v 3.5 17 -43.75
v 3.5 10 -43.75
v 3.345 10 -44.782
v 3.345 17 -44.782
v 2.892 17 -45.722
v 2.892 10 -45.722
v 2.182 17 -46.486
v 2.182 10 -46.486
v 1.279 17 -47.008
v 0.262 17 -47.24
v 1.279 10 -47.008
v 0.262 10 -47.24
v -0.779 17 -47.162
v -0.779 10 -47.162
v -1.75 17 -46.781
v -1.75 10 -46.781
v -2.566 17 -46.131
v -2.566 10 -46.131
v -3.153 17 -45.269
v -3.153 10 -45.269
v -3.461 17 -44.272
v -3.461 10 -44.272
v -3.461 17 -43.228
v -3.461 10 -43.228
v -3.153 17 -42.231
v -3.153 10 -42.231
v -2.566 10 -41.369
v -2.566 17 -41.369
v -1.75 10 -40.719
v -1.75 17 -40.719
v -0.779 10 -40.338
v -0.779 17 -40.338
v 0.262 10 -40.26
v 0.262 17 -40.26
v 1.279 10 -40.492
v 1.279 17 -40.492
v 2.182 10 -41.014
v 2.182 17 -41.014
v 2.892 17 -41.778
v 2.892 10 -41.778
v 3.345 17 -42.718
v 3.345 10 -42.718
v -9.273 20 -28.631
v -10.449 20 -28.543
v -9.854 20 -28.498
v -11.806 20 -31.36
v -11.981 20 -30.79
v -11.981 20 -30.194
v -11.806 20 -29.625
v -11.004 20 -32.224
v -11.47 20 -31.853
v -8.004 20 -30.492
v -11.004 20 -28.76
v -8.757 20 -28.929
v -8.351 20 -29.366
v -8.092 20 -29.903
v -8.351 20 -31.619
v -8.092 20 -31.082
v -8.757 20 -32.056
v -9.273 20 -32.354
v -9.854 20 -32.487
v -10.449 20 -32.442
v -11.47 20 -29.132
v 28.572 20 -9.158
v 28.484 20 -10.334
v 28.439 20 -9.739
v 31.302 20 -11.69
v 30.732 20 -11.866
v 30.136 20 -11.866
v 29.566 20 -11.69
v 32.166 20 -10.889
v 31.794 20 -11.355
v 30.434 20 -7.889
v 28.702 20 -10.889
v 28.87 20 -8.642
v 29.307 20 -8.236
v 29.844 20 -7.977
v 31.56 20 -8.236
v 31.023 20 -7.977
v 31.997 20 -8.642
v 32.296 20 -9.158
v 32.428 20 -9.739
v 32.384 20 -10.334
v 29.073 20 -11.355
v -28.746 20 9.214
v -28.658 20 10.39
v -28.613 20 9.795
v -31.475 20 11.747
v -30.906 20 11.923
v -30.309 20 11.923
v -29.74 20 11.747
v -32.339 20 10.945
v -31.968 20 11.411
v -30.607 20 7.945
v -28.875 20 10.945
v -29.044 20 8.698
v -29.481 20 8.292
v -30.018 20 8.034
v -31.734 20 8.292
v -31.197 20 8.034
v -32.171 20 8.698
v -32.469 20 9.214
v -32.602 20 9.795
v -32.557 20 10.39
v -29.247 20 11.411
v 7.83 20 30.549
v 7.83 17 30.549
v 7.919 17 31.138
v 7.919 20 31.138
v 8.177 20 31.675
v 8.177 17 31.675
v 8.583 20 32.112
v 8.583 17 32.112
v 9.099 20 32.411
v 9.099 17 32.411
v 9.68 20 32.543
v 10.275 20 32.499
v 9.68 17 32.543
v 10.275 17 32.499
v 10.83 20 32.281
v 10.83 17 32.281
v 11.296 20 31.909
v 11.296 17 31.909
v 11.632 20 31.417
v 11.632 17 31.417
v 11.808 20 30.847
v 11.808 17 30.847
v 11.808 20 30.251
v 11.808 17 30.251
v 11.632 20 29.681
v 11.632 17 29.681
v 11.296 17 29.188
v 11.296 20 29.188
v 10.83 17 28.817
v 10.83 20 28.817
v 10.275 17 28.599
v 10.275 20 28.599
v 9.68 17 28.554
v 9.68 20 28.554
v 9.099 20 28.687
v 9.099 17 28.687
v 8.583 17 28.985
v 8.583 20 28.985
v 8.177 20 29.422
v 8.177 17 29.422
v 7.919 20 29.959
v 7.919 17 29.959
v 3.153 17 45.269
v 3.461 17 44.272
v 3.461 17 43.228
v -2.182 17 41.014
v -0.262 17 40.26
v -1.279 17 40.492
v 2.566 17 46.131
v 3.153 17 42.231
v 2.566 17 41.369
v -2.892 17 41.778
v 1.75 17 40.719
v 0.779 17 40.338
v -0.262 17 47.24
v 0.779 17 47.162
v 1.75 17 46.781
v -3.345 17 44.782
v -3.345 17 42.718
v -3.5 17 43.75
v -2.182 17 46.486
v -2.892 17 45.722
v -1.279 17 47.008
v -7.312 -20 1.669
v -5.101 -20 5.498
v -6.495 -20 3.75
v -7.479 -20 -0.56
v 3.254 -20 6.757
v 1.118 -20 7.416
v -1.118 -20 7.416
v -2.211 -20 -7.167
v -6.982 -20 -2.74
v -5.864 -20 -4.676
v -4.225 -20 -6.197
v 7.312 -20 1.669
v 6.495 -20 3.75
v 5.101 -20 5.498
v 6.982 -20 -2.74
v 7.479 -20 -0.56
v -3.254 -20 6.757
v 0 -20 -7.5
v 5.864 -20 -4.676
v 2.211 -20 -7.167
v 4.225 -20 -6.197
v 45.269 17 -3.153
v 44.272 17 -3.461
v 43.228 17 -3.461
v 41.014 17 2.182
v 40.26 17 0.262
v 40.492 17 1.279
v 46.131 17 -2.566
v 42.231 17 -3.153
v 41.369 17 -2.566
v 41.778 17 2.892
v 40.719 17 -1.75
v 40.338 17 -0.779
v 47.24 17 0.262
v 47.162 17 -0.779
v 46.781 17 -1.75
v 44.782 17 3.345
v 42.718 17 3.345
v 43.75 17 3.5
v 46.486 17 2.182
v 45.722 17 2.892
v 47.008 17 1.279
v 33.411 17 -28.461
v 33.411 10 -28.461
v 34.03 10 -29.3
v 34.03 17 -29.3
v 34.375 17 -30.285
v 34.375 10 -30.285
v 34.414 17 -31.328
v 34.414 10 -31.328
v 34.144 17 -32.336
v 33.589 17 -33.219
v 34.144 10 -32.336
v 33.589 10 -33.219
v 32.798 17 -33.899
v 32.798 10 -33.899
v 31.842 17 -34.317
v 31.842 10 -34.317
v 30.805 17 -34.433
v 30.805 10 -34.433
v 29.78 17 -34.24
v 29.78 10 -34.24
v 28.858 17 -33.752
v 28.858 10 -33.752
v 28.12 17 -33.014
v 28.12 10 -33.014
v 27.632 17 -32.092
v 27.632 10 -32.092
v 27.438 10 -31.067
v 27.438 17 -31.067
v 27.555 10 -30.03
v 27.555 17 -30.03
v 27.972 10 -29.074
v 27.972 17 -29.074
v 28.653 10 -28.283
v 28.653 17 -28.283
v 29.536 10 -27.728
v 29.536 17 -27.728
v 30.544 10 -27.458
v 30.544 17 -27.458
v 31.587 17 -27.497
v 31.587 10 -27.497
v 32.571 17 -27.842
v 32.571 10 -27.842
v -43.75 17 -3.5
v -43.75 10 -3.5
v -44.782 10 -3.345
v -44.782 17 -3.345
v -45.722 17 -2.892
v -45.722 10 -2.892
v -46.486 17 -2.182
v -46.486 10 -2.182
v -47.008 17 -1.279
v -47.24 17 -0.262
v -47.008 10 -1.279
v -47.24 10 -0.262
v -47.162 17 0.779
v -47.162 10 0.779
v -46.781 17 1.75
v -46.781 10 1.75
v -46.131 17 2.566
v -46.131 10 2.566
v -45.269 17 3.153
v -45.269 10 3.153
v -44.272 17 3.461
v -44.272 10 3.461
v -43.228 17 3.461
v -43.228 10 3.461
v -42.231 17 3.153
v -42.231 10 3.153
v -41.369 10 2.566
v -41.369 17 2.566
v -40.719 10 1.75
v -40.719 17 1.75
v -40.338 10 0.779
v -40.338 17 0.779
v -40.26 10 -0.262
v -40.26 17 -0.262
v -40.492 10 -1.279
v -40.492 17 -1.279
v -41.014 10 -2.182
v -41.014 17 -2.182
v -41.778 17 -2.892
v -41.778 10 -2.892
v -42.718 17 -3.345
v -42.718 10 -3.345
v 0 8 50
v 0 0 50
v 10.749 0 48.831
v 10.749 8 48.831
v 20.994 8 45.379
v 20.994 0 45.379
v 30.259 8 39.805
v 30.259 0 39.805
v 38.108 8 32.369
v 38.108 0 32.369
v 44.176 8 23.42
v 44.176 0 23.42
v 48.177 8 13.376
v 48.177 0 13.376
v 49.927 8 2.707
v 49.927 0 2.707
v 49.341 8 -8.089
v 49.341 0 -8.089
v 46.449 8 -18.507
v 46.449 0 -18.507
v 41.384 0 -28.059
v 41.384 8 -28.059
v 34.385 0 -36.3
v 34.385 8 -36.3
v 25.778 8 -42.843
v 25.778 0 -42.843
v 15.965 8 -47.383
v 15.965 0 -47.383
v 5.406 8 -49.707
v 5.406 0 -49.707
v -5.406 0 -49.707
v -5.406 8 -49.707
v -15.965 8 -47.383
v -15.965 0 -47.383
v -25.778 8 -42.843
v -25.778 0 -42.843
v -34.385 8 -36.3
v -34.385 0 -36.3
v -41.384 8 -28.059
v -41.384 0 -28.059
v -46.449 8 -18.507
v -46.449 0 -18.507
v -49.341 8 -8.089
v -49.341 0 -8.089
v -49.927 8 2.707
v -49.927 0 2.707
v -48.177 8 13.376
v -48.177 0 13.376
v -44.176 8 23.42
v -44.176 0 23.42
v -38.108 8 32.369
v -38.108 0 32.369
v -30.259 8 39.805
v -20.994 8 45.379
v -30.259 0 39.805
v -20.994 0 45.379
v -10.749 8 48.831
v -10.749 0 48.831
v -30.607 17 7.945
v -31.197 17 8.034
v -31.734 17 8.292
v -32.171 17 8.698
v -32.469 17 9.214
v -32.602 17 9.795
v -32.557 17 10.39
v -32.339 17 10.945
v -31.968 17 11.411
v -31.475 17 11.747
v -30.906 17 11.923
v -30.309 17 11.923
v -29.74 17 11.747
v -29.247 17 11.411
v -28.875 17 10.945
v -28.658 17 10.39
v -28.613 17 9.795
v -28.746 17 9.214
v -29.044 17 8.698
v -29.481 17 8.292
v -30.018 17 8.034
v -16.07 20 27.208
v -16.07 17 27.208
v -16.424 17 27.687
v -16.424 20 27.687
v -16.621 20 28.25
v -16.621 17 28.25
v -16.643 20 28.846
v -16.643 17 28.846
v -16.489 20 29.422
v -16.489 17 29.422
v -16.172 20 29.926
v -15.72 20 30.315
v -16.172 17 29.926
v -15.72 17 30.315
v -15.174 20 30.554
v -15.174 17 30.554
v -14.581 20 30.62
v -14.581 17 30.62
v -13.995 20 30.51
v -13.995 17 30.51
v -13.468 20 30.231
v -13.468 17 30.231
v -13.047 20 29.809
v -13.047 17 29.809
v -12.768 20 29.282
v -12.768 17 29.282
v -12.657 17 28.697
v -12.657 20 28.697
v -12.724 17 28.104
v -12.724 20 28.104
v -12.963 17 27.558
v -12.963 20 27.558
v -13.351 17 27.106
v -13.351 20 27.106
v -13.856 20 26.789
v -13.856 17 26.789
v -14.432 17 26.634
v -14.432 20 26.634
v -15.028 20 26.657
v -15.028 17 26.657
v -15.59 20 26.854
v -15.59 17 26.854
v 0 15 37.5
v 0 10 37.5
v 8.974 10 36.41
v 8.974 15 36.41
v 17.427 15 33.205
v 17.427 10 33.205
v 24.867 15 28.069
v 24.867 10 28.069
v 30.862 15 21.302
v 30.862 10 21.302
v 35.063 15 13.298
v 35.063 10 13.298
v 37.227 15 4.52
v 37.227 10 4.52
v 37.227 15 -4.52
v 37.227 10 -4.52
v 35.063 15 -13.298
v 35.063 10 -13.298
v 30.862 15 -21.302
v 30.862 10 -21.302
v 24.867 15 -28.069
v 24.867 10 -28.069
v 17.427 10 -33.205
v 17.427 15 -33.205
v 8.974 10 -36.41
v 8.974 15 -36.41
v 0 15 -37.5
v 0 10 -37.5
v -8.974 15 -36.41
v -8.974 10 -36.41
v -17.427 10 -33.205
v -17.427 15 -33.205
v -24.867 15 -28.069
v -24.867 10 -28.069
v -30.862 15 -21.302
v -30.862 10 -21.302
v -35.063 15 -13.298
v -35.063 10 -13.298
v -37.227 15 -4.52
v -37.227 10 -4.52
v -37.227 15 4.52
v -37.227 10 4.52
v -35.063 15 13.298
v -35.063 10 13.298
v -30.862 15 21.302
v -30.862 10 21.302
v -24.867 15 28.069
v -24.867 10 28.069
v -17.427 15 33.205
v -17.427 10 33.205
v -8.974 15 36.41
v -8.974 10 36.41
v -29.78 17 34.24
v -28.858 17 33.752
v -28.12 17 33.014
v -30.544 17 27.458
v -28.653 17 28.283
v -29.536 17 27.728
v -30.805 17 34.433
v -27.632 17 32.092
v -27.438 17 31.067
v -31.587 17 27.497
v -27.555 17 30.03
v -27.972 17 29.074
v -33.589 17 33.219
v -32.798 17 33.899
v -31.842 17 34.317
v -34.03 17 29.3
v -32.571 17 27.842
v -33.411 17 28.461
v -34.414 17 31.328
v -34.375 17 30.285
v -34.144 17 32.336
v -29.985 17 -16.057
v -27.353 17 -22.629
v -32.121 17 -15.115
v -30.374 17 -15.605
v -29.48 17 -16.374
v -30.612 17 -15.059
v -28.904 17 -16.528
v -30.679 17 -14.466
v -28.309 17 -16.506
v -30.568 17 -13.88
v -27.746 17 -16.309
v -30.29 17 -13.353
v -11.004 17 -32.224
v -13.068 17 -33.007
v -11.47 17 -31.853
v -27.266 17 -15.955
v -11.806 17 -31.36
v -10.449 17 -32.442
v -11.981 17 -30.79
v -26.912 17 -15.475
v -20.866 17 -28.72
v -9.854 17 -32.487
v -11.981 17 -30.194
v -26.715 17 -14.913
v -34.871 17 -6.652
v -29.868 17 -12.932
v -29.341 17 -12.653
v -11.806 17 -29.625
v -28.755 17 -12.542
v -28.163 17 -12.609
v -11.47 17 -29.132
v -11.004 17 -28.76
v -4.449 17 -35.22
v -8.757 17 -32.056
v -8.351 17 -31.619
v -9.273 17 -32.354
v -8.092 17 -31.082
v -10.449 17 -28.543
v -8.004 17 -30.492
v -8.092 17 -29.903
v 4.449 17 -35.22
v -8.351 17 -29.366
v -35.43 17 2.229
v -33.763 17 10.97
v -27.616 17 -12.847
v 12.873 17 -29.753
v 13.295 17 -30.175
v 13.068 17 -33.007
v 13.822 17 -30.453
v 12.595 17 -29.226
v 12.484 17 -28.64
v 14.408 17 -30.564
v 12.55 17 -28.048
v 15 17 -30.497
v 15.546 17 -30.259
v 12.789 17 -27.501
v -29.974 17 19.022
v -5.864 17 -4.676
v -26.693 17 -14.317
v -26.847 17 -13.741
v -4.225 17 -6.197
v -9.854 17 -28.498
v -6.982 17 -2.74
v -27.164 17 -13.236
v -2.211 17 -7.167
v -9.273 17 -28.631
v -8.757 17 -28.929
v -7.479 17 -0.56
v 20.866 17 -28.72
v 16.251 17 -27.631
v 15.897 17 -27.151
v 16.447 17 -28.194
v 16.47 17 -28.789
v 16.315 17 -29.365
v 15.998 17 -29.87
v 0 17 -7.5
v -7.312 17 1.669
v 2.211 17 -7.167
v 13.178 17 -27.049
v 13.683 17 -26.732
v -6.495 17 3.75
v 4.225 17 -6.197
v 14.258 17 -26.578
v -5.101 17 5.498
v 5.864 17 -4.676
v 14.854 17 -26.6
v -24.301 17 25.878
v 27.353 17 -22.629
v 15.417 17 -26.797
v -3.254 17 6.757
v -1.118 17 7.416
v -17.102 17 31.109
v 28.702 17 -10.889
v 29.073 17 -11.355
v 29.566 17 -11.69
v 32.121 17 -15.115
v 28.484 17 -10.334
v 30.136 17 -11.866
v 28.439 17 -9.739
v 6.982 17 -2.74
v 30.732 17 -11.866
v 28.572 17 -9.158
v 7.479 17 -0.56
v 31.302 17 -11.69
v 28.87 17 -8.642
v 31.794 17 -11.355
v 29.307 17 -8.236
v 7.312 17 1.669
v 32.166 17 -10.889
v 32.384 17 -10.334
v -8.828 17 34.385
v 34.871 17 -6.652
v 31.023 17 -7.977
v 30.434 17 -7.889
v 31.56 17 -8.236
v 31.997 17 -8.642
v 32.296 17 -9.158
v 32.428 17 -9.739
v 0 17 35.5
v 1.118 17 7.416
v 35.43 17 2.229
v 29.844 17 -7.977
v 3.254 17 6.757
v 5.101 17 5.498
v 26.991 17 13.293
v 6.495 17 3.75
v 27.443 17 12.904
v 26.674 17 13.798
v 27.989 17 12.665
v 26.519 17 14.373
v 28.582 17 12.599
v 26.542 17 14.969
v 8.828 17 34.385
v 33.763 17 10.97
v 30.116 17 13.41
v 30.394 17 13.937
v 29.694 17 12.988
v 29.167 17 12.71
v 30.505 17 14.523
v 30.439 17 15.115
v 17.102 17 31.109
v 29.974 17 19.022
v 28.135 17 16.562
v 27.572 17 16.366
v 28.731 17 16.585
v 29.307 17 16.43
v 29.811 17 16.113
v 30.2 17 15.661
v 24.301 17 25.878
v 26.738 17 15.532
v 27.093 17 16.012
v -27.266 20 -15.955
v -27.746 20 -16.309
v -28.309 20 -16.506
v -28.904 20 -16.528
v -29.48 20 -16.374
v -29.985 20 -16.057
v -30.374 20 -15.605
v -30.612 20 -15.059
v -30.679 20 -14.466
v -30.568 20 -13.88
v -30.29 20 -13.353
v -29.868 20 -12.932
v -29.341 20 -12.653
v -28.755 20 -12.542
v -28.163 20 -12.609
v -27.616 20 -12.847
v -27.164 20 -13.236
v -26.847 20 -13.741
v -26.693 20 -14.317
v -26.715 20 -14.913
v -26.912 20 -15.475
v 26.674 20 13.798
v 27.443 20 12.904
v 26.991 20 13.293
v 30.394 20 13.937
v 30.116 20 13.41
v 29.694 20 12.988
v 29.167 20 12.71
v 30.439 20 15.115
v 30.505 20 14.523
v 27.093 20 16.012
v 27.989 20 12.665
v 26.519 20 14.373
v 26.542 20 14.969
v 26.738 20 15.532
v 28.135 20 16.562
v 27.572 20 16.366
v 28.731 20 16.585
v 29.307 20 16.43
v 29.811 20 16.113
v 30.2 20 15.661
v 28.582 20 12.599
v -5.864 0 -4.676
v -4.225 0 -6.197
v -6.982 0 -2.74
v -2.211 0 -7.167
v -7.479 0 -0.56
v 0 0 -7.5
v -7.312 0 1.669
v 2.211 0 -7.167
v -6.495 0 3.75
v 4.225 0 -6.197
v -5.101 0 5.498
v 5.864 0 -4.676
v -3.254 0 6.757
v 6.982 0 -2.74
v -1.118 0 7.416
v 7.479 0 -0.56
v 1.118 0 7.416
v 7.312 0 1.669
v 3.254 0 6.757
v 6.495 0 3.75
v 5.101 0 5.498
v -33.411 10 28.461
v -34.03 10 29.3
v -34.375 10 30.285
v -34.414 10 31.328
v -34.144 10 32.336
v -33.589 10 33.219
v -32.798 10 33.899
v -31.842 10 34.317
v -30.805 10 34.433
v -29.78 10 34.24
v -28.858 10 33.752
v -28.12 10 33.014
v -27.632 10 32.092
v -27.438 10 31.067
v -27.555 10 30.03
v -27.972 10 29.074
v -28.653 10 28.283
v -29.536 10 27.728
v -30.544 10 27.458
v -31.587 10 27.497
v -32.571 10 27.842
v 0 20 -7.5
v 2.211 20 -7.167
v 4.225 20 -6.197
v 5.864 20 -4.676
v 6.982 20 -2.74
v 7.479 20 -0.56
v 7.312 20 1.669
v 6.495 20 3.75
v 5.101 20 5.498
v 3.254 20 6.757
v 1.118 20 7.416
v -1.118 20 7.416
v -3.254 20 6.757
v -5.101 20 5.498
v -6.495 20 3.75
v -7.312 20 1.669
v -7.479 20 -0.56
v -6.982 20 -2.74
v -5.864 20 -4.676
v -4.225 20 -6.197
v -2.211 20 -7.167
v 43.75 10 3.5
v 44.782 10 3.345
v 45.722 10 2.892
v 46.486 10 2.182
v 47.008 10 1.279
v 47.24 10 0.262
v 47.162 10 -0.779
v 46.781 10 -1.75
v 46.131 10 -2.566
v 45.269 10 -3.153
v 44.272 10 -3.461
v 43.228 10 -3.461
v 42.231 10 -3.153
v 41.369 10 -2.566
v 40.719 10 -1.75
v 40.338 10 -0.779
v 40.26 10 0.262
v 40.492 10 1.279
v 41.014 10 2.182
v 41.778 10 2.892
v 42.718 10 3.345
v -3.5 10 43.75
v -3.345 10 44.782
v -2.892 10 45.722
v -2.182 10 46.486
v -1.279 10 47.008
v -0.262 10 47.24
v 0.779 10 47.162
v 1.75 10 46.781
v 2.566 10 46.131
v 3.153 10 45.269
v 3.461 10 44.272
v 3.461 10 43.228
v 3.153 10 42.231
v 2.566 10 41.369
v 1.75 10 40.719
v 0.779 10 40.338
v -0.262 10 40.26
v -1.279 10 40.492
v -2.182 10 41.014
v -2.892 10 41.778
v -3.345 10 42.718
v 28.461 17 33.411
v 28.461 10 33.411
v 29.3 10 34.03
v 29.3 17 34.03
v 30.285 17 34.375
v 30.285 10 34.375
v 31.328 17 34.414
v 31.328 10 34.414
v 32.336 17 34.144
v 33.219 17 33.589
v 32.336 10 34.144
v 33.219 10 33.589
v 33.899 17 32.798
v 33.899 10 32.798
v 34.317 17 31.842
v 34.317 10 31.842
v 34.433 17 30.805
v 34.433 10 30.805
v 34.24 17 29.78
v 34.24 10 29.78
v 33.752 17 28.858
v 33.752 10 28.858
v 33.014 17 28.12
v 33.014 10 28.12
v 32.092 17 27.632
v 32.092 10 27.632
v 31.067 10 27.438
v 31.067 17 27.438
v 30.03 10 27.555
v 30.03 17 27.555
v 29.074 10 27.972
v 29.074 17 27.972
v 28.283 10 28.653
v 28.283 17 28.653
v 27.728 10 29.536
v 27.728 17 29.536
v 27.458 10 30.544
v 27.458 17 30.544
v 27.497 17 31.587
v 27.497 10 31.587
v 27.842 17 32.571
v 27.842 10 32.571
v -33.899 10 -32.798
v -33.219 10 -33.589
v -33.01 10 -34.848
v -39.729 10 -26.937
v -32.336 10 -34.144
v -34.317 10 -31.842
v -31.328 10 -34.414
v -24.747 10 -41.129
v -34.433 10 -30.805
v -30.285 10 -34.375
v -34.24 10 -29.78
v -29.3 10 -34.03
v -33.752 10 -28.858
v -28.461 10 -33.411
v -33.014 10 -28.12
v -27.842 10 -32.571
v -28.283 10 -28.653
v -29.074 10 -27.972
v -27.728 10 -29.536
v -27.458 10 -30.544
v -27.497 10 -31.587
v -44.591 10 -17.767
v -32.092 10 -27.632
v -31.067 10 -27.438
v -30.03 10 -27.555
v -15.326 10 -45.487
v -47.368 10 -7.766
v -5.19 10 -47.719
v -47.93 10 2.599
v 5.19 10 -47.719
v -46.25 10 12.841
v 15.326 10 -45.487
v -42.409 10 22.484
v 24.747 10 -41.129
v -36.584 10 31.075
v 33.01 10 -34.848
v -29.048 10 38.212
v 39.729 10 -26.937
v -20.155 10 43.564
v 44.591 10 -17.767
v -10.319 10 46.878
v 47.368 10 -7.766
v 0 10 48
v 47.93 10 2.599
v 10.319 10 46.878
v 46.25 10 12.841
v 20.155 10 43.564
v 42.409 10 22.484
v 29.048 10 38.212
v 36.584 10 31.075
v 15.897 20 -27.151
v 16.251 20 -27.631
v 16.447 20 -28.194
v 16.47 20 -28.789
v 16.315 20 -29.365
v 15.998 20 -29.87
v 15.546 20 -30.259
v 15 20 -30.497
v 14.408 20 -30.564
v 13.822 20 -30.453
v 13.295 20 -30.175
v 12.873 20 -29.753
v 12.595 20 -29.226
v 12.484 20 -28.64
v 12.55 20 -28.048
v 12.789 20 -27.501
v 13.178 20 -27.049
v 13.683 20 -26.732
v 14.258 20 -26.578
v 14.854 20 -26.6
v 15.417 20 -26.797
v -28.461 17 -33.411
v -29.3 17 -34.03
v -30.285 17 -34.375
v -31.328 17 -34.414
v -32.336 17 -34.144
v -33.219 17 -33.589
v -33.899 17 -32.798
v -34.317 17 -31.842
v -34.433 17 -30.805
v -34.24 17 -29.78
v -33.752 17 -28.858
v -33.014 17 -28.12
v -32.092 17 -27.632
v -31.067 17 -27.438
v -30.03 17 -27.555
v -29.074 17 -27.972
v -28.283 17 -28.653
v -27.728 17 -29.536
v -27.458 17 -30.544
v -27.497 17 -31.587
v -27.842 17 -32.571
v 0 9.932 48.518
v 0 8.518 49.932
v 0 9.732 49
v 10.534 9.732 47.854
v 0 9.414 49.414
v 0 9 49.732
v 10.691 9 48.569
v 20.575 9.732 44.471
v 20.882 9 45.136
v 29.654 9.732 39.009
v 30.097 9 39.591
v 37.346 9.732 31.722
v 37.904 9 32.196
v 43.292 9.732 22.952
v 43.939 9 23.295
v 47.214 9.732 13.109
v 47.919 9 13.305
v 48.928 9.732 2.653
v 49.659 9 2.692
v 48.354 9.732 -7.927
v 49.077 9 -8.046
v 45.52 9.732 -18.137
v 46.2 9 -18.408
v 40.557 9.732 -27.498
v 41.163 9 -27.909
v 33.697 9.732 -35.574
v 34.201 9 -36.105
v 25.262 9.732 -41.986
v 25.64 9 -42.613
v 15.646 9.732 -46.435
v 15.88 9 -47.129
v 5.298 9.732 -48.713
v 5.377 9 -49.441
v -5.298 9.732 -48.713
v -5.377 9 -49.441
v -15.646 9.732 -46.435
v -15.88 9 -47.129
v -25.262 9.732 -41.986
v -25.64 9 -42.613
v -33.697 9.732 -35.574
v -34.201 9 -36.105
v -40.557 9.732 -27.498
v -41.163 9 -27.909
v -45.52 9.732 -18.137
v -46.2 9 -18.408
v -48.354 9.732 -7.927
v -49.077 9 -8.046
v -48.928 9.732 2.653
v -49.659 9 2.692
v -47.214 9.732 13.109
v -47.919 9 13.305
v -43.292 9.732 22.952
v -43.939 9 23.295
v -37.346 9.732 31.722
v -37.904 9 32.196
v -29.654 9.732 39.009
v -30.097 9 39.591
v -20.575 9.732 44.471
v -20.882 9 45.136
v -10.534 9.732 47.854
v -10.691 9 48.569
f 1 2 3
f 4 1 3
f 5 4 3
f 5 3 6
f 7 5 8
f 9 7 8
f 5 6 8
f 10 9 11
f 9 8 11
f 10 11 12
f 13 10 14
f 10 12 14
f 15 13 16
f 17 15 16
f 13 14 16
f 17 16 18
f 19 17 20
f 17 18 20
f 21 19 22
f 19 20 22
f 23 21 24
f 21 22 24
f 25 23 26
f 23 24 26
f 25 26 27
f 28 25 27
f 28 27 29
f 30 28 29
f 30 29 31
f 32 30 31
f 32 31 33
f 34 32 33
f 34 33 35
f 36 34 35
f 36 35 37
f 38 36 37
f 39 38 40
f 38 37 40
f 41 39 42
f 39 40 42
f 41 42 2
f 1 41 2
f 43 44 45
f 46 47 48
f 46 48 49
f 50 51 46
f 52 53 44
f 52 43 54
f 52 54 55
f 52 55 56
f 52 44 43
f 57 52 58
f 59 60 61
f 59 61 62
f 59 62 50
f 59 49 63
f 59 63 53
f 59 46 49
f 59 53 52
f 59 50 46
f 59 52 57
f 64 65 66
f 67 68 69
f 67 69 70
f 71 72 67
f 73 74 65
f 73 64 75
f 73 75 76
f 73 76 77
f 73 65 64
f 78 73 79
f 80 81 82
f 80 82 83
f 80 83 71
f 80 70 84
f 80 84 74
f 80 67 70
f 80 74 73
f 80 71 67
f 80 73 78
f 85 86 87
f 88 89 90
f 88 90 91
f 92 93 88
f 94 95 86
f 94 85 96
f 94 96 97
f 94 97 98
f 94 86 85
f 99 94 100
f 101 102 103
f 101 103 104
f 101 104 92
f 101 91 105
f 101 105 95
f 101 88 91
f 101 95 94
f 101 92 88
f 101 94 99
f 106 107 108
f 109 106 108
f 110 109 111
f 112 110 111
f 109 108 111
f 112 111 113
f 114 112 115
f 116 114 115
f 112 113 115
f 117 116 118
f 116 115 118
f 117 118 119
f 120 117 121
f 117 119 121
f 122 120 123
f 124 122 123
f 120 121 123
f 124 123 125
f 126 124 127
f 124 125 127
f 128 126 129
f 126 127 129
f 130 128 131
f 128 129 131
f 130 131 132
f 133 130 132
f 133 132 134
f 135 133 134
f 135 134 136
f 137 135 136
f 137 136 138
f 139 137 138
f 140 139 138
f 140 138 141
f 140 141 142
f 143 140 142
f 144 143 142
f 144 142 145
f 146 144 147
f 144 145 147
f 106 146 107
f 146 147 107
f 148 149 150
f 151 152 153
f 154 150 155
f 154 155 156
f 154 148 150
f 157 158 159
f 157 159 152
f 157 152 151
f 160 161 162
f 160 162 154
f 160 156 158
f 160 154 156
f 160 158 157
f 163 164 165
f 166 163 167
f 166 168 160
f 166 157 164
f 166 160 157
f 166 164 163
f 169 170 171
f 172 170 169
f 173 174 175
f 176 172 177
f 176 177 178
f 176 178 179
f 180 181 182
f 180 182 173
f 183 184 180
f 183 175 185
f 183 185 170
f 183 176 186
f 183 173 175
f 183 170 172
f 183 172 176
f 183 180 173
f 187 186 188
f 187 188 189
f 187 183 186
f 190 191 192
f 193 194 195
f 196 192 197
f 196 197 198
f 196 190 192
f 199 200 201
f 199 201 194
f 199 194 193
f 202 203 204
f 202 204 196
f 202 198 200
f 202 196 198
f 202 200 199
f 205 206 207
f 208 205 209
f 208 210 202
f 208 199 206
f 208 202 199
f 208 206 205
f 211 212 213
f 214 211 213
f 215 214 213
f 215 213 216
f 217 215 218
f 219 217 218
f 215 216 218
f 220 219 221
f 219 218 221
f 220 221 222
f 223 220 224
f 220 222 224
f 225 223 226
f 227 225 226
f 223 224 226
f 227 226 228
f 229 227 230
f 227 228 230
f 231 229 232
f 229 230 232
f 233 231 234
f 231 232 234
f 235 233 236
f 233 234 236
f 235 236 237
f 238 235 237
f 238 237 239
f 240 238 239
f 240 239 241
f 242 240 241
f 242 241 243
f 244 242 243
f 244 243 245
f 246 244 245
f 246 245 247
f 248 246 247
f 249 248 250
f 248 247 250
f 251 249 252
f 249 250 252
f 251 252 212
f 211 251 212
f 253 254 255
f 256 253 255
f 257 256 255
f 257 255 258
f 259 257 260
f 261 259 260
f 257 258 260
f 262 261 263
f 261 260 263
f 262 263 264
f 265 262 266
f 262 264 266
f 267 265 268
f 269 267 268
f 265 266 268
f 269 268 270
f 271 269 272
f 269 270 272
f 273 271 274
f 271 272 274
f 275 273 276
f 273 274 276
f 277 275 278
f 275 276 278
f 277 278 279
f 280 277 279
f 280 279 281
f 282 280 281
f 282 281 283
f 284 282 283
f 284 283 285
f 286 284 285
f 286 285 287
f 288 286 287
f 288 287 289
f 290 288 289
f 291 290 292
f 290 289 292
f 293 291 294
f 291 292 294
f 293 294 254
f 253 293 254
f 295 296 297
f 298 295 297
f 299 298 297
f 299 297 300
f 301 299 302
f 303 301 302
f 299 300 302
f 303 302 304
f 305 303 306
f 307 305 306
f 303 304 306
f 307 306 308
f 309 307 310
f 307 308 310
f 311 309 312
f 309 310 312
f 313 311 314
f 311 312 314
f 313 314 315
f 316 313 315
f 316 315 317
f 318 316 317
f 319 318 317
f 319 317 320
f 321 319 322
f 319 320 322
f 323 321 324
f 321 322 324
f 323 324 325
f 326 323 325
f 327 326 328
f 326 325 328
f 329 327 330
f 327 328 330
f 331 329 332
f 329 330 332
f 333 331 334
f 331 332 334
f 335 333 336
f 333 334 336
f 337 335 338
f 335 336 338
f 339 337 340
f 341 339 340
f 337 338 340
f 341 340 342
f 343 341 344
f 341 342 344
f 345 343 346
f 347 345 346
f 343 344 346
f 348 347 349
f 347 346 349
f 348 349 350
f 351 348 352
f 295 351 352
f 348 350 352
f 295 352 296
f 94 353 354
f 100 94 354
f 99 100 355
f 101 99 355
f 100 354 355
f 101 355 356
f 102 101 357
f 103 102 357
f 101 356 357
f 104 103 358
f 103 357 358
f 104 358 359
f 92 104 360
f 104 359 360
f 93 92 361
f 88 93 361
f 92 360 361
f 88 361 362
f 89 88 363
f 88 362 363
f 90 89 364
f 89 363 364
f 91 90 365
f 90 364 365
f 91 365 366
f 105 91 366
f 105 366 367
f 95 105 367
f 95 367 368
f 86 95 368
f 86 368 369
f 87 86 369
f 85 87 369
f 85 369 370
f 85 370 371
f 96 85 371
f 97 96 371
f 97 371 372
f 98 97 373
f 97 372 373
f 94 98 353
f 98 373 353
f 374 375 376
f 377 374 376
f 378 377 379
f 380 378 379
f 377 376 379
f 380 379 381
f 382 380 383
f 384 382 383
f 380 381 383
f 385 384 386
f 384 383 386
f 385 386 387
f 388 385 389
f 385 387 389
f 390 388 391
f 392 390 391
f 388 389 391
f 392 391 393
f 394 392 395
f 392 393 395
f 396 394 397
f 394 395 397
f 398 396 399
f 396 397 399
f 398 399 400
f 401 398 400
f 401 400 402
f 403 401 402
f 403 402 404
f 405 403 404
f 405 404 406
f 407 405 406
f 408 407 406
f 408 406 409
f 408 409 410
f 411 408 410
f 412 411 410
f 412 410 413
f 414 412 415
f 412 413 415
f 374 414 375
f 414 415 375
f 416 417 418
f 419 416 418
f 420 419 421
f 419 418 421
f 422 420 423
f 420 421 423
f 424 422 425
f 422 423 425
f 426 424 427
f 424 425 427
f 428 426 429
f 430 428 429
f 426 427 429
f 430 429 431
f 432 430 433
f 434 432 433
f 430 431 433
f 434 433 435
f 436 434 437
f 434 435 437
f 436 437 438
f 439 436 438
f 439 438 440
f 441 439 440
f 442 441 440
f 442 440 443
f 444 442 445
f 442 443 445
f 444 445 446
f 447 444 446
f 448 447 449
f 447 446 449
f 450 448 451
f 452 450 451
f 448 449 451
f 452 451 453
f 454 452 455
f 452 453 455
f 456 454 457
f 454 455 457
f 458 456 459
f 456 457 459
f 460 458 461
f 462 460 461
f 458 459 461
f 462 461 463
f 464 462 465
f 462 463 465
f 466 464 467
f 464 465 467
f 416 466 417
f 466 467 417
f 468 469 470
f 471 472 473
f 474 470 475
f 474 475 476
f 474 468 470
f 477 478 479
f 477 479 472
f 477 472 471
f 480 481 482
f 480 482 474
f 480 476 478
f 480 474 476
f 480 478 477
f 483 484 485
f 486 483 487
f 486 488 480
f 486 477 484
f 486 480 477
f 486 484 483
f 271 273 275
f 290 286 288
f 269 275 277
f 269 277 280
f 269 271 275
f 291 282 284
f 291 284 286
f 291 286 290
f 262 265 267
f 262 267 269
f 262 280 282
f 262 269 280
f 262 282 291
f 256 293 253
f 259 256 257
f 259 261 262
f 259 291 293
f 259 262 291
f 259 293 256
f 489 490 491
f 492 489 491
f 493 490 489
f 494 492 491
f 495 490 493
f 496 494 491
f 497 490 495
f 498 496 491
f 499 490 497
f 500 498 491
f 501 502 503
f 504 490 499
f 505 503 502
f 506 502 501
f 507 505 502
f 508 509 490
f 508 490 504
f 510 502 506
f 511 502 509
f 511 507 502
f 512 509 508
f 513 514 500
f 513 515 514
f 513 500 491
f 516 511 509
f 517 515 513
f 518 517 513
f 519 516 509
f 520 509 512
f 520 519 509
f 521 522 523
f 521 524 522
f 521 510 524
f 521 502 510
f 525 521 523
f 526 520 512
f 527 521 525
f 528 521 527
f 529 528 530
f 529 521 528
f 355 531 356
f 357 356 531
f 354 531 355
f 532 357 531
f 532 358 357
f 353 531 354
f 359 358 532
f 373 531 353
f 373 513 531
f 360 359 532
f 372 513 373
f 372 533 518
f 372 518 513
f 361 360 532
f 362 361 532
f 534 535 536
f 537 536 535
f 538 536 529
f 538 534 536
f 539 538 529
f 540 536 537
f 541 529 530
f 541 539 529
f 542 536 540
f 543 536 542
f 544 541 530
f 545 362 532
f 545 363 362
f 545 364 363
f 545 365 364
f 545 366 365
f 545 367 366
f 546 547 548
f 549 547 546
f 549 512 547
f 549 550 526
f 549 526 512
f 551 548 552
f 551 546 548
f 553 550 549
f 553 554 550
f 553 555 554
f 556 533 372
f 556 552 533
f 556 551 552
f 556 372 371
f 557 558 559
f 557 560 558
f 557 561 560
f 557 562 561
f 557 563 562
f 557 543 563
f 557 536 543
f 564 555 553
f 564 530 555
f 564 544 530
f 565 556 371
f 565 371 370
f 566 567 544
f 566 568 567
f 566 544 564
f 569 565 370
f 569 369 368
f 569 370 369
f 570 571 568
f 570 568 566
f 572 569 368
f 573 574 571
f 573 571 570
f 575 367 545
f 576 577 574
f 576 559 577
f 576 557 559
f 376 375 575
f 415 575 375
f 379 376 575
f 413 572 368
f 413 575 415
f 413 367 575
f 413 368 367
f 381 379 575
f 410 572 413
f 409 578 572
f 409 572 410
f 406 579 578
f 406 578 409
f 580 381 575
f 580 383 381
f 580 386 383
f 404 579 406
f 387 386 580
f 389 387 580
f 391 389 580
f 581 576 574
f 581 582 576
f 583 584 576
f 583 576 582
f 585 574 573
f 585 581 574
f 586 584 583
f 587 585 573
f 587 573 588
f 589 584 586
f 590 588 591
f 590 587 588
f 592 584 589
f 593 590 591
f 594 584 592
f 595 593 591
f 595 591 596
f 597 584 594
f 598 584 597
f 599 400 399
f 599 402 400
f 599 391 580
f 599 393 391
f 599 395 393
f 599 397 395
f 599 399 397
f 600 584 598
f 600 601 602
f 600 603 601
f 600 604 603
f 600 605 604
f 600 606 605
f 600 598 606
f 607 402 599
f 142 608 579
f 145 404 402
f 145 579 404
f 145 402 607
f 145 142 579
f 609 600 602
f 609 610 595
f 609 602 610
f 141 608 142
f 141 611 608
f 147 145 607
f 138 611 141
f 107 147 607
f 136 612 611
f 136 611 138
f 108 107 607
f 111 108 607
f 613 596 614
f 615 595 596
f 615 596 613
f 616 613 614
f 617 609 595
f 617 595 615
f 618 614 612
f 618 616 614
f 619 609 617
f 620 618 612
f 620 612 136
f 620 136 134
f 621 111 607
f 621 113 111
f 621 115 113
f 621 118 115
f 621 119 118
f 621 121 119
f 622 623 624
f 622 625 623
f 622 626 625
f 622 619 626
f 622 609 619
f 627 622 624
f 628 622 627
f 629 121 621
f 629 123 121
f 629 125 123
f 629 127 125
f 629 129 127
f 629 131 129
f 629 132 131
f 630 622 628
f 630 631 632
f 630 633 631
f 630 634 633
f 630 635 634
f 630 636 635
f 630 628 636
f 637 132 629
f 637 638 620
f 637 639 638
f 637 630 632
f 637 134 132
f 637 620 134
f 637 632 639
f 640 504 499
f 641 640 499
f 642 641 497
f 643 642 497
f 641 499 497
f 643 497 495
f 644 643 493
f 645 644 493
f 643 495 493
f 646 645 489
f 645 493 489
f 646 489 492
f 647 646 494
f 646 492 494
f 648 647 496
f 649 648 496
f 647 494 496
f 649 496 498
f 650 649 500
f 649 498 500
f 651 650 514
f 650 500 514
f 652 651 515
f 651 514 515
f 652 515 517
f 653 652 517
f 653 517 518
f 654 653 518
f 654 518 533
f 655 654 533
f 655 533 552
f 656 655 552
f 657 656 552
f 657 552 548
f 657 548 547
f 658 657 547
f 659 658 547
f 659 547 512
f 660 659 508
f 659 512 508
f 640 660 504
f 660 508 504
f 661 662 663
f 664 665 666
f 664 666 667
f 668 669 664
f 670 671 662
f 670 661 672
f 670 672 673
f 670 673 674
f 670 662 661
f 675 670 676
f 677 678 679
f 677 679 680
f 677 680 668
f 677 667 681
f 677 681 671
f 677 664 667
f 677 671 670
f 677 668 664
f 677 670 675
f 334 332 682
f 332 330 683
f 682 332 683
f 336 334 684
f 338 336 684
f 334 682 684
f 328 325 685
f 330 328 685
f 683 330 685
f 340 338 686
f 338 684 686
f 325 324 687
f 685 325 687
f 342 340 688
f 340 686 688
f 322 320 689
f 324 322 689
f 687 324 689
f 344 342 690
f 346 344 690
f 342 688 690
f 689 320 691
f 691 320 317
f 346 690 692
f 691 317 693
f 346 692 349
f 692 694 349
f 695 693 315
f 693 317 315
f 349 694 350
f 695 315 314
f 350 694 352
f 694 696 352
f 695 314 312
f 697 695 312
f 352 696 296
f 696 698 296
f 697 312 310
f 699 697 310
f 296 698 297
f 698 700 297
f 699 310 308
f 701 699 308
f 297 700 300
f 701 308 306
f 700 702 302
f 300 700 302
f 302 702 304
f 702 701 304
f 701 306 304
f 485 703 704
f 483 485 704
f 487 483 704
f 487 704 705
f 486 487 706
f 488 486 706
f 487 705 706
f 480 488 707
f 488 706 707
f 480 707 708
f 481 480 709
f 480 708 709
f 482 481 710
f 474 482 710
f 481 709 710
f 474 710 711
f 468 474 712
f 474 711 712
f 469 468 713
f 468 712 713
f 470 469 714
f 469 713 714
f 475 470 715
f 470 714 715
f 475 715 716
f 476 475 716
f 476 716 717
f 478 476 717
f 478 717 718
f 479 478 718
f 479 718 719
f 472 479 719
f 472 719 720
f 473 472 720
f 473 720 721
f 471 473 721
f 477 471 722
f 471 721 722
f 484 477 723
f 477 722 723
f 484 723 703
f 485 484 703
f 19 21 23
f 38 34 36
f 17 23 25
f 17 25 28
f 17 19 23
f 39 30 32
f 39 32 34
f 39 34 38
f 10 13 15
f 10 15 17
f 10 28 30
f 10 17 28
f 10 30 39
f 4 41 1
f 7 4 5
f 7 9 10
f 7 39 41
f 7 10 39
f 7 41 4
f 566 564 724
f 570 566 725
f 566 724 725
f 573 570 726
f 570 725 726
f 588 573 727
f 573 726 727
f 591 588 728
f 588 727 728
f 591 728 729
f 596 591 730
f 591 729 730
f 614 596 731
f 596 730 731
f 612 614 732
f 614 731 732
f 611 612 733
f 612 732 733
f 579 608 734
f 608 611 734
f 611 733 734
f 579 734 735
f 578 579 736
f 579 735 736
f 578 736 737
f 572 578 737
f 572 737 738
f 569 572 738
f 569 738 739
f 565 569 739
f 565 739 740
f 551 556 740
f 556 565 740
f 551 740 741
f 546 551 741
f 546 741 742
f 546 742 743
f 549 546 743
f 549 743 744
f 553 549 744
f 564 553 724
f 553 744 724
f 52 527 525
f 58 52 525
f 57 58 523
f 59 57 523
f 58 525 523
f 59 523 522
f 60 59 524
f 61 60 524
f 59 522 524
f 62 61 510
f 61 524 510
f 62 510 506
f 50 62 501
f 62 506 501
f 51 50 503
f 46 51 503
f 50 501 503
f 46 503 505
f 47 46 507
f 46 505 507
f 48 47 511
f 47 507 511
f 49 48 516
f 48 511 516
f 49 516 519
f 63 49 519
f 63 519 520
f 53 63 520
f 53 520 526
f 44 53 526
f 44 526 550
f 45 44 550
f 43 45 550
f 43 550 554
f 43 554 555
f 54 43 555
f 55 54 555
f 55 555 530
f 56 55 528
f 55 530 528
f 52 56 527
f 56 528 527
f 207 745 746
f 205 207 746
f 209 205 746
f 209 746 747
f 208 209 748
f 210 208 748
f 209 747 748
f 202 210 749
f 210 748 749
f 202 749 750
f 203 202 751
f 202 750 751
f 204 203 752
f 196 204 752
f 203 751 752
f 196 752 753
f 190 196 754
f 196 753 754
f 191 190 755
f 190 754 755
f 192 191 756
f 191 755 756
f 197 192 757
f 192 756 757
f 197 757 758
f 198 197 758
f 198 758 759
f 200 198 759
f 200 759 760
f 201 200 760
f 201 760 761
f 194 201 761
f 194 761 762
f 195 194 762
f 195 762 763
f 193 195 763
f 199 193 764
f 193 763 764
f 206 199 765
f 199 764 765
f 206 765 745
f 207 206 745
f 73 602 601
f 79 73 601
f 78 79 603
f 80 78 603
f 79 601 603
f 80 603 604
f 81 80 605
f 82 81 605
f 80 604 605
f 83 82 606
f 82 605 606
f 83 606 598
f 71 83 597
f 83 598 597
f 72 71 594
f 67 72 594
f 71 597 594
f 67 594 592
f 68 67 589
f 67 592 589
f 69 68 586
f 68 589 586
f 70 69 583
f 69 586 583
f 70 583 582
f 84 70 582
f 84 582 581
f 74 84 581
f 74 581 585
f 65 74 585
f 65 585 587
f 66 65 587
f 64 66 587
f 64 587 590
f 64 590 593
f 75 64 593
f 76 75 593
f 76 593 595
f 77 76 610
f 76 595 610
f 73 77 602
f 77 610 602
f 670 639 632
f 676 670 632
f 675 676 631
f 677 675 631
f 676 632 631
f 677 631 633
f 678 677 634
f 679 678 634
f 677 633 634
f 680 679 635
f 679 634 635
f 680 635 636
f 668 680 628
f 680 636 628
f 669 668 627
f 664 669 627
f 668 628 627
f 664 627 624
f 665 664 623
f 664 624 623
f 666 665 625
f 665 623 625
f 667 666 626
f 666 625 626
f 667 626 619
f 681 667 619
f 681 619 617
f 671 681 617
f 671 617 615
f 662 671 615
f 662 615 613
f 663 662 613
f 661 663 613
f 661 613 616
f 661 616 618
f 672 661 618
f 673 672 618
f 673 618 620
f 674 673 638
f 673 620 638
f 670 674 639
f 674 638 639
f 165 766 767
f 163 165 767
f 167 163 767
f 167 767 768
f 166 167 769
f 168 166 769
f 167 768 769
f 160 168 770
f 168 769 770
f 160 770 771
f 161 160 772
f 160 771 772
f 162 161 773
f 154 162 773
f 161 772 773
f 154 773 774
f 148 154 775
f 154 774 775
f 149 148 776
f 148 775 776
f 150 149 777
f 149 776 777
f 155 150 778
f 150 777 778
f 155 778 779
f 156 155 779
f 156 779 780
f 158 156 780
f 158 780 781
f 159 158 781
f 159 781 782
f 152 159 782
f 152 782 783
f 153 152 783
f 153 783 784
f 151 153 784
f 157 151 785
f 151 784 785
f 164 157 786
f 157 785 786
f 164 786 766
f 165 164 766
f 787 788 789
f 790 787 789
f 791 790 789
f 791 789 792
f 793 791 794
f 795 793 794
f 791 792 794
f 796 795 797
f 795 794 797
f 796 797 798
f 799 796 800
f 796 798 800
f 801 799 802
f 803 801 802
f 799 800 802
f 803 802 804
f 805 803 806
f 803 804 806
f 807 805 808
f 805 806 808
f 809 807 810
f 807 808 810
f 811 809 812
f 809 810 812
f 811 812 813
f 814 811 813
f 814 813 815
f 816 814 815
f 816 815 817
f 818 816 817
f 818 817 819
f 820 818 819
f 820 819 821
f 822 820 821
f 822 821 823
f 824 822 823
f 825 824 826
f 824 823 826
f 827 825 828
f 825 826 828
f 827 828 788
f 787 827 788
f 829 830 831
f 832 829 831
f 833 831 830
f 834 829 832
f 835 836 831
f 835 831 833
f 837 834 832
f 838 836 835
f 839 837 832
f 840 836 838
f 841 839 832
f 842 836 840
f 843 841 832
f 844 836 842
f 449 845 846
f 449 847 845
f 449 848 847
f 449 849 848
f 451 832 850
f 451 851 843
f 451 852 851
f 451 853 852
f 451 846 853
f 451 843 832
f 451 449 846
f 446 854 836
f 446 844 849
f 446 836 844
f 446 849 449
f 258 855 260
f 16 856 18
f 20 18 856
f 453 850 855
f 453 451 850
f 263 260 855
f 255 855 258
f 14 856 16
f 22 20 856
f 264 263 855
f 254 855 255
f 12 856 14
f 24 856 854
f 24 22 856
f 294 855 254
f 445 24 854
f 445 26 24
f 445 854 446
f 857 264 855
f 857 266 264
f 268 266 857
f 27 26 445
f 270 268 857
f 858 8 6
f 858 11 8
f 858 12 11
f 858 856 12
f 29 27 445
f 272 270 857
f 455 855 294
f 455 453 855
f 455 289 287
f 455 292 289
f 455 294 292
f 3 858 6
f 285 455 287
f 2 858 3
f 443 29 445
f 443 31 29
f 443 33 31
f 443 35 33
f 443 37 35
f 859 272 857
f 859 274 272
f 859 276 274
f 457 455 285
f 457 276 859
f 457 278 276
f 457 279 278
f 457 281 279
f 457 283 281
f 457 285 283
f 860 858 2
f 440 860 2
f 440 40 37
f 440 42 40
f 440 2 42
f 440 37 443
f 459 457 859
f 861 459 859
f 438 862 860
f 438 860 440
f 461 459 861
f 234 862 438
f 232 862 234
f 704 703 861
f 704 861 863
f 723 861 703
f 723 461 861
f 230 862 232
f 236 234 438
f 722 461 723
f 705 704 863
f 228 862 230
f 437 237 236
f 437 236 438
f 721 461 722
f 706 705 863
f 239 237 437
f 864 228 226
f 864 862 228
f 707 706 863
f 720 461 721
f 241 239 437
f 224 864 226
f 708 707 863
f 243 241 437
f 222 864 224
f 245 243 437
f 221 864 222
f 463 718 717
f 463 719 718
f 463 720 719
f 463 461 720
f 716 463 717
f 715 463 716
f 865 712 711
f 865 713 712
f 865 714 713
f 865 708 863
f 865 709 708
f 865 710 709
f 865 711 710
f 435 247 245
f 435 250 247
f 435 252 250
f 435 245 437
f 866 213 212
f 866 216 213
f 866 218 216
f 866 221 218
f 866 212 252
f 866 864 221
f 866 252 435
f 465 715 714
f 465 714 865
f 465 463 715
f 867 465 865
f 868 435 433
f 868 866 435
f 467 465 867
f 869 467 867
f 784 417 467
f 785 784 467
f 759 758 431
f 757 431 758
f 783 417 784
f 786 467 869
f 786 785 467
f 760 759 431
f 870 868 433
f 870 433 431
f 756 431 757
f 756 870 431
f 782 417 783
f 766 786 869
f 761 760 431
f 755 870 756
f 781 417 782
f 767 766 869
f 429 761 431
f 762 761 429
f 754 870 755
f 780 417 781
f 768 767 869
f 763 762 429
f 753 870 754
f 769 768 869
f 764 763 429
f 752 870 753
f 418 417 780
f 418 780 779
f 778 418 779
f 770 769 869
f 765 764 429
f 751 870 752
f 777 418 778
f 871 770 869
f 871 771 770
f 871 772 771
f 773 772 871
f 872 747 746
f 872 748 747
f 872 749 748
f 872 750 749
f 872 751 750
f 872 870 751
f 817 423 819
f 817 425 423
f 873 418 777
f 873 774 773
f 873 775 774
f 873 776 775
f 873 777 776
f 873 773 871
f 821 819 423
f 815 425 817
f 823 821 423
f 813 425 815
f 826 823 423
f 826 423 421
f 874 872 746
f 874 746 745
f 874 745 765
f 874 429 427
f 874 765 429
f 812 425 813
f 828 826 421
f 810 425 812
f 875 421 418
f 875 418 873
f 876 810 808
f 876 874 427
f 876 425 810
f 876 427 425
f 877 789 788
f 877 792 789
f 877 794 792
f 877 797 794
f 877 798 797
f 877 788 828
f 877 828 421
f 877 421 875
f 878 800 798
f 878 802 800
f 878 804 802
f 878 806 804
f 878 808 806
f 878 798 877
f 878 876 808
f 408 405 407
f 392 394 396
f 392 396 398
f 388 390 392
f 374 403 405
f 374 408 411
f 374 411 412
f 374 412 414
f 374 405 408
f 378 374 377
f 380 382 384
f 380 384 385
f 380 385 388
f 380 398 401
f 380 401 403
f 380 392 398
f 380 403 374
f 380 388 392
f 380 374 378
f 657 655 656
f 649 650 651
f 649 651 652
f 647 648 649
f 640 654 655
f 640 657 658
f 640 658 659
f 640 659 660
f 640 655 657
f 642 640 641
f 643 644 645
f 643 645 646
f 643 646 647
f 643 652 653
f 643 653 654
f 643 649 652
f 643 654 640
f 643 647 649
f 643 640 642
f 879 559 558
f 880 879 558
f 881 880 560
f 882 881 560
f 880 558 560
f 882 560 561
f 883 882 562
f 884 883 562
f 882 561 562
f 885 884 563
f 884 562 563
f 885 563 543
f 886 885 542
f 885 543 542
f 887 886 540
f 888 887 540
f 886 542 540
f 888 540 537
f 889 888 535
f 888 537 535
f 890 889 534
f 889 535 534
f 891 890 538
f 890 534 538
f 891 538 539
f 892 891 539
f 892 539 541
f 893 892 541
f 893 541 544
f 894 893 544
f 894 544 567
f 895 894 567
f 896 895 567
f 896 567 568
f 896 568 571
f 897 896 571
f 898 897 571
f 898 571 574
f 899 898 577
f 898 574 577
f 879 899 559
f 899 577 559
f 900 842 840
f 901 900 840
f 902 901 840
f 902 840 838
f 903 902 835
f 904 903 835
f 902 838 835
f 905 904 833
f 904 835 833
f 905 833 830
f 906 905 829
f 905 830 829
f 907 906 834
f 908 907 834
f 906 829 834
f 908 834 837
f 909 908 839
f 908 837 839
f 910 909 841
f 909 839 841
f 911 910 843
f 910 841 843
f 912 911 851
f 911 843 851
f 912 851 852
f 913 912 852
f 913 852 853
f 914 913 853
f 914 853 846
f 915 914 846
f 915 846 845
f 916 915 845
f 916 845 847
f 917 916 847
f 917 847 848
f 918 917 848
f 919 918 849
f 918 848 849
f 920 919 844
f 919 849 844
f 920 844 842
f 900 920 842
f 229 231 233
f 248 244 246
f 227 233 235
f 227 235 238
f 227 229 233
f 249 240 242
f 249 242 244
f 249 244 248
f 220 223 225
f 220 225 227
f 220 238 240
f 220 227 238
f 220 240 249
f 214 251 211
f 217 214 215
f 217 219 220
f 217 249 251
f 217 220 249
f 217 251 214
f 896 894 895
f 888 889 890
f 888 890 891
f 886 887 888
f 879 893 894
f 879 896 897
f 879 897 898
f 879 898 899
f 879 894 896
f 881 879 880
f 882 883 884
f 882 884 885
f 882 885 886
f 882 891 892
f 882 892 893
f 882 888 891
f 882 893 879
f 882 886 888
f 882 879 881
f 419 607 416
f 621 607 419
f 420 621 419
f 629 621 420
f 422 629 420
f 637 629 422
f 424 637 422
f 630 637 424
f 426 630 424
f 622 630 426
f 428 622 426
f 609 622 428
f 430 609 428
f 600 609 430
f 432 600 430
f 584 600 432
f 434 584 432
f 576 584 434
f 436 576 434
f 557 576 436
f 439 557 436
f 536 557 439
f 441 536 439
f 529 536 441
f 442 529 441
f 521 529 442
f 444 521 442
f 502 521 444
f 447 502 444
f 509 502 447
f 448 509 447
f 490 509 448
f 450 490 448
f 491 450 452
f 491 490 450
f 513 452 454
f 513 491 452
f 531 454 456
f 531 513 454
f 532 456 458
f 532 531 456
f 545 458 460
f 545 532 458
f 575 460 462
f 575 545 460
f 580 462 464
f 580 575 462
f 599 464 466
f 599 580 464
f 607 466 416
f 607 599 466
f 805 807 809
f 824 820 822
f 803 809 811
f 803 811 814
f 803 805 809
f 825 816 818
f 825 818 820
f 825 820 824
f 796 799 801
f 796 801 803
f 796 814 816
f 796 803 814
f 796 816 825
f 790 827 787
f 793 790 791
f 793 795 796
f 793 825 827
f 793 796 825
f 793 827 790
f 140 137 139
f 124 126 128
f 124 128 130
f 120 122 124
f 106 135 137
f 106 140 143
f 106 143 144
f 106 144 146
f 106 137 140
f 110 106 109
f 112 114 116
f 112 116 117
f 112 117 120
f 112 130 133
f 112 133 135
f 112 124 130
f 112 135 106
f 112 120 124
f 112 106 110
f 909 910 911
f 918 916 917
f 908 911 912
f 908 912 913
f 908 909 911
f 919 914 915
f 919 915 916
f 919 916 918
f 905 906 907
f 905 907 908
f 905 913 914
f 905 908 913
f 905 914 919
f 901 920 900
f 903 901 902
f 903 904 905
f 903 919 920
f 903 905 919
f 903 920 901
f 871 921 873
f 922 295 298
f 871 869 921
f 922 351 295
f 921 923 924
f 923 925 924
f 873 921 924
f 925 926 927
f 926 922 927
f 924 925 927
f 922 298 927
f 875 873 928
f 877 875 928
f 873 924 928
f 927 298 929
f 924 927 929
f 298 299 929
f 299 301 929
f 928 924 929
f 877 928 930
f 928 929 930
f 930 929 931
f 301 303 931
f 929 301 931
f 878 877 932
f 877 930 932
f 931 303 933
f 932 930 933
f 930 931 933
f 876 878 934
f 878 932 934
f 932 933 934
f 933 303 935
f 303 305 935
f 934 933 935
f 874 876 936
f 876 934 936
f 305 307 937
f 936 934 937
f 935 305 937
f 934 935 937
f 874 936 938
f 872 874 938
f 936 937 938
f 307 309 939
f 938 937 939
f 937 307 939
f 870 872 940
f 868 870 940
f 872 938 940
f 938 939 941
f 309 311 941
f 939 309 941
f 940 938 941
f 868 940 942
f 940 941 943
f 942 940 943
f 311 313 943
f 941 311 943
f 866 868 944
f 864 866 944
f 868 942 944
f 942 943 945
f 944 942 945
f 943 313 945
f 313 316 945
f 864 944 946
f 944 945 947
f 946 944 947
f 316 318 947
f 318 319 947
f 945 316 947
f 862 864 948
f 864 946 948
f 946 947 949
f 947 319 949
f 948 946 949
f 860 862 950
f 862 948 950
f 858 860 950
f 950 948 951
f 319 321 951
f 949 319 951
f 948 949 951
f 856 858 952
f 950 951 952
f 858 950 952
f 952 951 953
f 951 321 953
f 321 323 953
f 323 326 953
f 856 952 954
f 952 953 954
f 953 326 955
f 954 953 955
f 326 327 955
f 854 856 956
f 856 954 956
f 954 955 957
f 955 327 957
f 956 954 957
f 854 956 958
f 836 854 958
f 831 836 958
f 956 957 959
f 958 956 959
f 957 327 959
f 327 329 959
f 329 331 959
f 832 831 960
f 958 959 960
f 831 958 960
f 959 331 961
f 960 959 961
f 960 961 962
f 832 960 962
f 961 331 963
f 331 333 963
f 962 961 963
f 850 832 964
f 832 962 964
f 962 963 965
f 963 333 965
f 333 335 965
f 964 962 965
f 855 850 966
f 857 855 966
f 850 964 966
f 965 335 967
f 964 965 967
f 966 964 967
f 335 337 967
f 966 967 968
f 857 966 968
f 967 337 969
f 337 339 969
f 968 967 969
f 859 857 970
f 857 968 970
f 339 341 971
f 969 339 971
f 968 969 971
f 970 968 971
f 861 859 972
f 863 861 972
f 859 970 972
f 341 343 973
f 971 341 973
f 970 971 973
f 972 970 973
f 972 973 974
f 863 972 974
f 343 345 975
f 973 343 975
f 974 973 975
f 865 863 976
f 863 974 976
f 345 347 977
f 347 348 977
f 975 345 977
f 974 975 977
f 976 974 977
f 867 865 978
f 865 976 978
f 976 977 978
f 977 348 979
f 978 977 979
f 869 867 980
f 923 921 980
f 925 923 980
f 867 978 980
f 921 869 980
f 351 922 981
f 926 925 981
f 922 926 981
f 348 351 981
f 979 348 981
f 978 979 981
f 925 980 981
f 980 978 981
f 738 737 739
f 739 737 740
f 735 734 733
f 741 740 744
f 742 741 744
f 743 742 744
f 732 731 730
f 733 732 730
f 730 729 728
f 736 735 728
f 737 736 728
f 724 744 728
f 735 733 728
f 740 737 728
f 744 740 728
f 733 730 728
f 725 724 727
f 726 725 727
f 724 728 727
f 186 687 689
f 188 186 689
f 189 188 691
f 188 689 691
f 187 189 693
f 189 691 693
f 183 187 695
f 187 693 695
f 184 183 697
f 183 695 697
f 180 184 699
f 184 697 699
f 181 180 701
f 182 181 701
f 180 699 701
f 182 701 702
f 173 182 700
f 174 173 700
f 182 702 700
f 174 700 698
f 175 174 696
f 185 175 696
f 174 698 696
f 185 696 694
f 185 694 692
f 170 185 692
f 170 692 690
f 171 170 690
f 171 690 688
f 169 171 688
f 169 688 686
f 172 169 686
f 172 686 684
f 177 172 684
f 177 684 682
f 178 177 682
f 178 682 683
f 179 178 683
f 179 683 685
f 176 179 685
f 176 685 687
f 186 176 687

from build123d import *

# Parameters (mm, degrees)
SKETCH2_R                = 50
BOSS_EXTRUDE1_DEPTH      = 10
SKETCH4_R                = 37.5
BOSS_EXTRUDE3_DEPTH      = 7
SKETCH5_R                = 3.5
BOSS_EXTRUDE4_DEPTH      = 7
CIRPATTERN1_COUNT        = 8
SKETCH6_R                = 2
BOSS_EXTRUDE5_DEPTH      = 3
CIRPATTERN2_COUNT        = 8
CHAMFER1_SIZE            = 2
FILLET1_R                = 2
BOSS_EXTRUDE6_DEPTH      = 20
BOSS_EXTRUDE6_DEPTH_BACK = 20
SKETCH7_R                = 7.5


with BuildPart() as part:
    # Sketch2 → Boss-Extrude1 (new body)
    with BuildSketch(Plane(origin=(0, 0, 0), x_dir=(1, 0, 0), z_dir=(0, 1, 0))):
        with Locations(Location((0, 0, 0), (0, 0, 270))):
            Circle(SKETCH2_R)
    extrude(amount=BOSS_EXTRUDE1_DEPTH)

    # Sketch4 → Boss-Extrude3 (add)
    with BuildSketch(Plane(origin=(0, 10, 0), x_dir=(1, 0, 0), z_dir=(0, 1, 0))):
        with Locations(Location((0, 0, 0), (0, 0, 270))):
            Circle(SKETCH4_R)
    extrude(amount=BOSS_EXTRUDE3_DEPTH)

    # Sketch5 → Boss-Extrude4 (add)
    with BuildSketch(Plane(origin=(0, 10, 0), x_dir=(1, 0, 0), z_dir=(0, 1, 0))):
        with Locations(Location((43.75, 0, 0), (0, 0, 270))):
            Circle(SKETCH5_R)
    boss_extrude4 = extrude(amount=BOSS_EXTRUDE4_DEPTH)

    # CirPattern1: Boss-Extrude4 ×8 about axis
    cirpattern1_axis = Axis((0, 0, 0), (0, 1, 0))
    for i in range(1, CIRPATTERN1_COUNT):
        add(boss_extrude4.rotate(cirpattern1_axis, i * 360 / CIRPATTERN1_COUNT))

    # Sketch6 → Boss-Extrude5 (add)
    with BuildSketch(Plane(origin=(0, 17, 0), x_dir=(1, 0, 0), z_dir=(0, 1, 0))):
        with Locations(Location((30.433808521, 9.88854382, 0), (0, 0, 270))):
            Circle(SKETCH6_R)
    boss_extrude5 = extrude(amount=BOSS_EXTRUDE5_DEPTH)

    # CirPattern2: Boss-Extrude5 ×8 about axis
    cirpattern2_axis = Axis((-0.086814216, 0, 0.028207649), (0, 1, 0))
    for i in range(1, CIRPATTERN2_COUNT):
        add(boss_extrude5.rotate(cirpattern2_axis, i * 360 / CIRPATTERN2_COUNT))

    # Chamfer1
    chamfer1_edges = [part.edges().sort_by_distance(p)[0] for p in [
        (0, 17, -37.5),
    ]]
    chamfer(chamfer1_edges, length=CHAMFER1_SIZE)

    # Fillet1
    fillet1_edges = [part.edges().sort_by_distance(p)[0] for p in [
        (0, 10, -50),
    ]]
    fillet(fillet1_edges, radius=FILLET1_R)

    # Sketch7 → Boss-Extrude6 (add, two sides: drawn at the far end of the back side and taken through both)
    with BuildSketch(Plane.XZ.offset(-BOSS_EXTRUDE6_DEPTH_BACK)):
        with Locations(Location((0, 0, 0), (0, 0, 270))):
            Circle(SKETCH7_R)
    extrude(amount=BOSS_EXTRUDE6_DEPTH + BOSS_EXTRUDE6_DEPTH_BACK)


solid = part.part
